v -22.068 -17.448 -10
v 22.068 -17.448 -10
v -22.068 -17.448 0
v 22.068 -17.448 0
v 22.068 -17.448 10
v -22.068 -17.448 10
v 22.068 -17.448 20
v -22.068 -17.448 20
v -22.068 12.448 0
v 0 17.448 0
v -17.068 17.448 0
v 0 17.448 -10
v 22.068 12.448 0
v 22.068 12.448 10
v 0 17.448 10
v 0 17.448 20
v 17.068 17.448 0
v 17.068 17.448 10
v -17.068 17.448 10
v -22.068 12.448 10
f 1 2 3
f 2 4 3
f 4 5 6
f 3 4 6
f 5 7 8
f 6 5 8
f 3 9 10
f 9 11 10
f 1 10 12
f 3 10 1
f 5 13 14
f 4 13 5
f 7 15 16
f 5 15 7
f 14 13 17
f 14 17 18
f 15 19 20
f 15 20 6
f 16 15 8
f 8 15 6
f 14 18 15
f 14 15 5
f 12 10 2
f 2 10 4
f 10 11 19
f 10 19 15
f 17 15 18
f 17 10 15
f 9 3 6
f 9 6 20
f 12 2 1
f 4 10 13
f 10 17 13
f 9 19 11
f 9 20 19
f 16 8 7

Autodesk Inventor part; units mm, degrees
ref_plane "YZ Plane" through (0, 0, 0) normal (1, 0, 0) x (0, 1, 0)
ref_plane "XZ Plane" through (0, 0, 0) normal (0, 1, 0) x (-1, 0, 0)
ref_plane "XY Plane" through (0, 0, 0) normal (0, 0, 1) x (1, 0, 0)
sketch "스케치1" plane through (0, 0, 0) normal (0, 0, 1) x (1, 0, 0)
  line L0 (22.0682, -17.448) -> (-22.0682, -17.448)
  line L1 (-22.0682, -17.448) -> (-22.0682, 17.448)
  line L2 (-22.0682, 17.448) -> (22.0682, 17.448)
  line L3 (22.0682, 17.448) -> (22.0682, -17.448)
  line L4 (22.0682, -17.448) -> (-22.0682, 17.448) construction
  line L5 (-22.0682, -17.448) -> (22.0682, 17.448) construction
  point P0 (0, 0)
extrude "돌출1" add sketch "스케치1" along normal blind 10
sketch "스케치2" plane through (0, 0, 10) normal (0, 0, 1) x (1, 0, 0)
  line L0 (22.0682, 17.448) -> (-22.0682, 17.448) projected
  line L1 (-22.0682, -17.448) -> (22.0682, -17.448) projected
  line L2 (0, 17.448) -> (22.0682, -17.448)
  line L3 (0, 17.448) -> (-22.0682, -17.448)
  point P0 (0, 0)
extrude "돌출2" add sketch "스케치2" along normal blind 10
sketch "스케치3" plane through (0, 0, 0) normal (0, 0, -1) x (-1, 0, 0)
  line L0 (0, 17.448) -> (22.0682, 17.448) projected
  line L1 (-22.0682, -17.448) -> (22.0682, -17.448) projected
  line L2 (0, 17.448) -> (-22.0682, -17.448)
  line L3 (0, 17.448) -> (22.0682, -17.448) projected
  line L4 (22.0682, 17.448) -> (22.0682, -17.448) projected
  line L5 (0, 17.448) -> (22.0682, -17.448)
  point P0 (0, 0)
extrude "돌출3" add sketch "스케치3" along normal blind 10 contours L3 L1 L2
chamfer "모따기1" distance 5 angle 45 1 edges at (22.0682, 17.448, 5)
chamfer "모따기2" distance 5 angle 45 1 edges at (-22.0682, 17.448, 5)
properties part number "240503_3Dsketch08"
